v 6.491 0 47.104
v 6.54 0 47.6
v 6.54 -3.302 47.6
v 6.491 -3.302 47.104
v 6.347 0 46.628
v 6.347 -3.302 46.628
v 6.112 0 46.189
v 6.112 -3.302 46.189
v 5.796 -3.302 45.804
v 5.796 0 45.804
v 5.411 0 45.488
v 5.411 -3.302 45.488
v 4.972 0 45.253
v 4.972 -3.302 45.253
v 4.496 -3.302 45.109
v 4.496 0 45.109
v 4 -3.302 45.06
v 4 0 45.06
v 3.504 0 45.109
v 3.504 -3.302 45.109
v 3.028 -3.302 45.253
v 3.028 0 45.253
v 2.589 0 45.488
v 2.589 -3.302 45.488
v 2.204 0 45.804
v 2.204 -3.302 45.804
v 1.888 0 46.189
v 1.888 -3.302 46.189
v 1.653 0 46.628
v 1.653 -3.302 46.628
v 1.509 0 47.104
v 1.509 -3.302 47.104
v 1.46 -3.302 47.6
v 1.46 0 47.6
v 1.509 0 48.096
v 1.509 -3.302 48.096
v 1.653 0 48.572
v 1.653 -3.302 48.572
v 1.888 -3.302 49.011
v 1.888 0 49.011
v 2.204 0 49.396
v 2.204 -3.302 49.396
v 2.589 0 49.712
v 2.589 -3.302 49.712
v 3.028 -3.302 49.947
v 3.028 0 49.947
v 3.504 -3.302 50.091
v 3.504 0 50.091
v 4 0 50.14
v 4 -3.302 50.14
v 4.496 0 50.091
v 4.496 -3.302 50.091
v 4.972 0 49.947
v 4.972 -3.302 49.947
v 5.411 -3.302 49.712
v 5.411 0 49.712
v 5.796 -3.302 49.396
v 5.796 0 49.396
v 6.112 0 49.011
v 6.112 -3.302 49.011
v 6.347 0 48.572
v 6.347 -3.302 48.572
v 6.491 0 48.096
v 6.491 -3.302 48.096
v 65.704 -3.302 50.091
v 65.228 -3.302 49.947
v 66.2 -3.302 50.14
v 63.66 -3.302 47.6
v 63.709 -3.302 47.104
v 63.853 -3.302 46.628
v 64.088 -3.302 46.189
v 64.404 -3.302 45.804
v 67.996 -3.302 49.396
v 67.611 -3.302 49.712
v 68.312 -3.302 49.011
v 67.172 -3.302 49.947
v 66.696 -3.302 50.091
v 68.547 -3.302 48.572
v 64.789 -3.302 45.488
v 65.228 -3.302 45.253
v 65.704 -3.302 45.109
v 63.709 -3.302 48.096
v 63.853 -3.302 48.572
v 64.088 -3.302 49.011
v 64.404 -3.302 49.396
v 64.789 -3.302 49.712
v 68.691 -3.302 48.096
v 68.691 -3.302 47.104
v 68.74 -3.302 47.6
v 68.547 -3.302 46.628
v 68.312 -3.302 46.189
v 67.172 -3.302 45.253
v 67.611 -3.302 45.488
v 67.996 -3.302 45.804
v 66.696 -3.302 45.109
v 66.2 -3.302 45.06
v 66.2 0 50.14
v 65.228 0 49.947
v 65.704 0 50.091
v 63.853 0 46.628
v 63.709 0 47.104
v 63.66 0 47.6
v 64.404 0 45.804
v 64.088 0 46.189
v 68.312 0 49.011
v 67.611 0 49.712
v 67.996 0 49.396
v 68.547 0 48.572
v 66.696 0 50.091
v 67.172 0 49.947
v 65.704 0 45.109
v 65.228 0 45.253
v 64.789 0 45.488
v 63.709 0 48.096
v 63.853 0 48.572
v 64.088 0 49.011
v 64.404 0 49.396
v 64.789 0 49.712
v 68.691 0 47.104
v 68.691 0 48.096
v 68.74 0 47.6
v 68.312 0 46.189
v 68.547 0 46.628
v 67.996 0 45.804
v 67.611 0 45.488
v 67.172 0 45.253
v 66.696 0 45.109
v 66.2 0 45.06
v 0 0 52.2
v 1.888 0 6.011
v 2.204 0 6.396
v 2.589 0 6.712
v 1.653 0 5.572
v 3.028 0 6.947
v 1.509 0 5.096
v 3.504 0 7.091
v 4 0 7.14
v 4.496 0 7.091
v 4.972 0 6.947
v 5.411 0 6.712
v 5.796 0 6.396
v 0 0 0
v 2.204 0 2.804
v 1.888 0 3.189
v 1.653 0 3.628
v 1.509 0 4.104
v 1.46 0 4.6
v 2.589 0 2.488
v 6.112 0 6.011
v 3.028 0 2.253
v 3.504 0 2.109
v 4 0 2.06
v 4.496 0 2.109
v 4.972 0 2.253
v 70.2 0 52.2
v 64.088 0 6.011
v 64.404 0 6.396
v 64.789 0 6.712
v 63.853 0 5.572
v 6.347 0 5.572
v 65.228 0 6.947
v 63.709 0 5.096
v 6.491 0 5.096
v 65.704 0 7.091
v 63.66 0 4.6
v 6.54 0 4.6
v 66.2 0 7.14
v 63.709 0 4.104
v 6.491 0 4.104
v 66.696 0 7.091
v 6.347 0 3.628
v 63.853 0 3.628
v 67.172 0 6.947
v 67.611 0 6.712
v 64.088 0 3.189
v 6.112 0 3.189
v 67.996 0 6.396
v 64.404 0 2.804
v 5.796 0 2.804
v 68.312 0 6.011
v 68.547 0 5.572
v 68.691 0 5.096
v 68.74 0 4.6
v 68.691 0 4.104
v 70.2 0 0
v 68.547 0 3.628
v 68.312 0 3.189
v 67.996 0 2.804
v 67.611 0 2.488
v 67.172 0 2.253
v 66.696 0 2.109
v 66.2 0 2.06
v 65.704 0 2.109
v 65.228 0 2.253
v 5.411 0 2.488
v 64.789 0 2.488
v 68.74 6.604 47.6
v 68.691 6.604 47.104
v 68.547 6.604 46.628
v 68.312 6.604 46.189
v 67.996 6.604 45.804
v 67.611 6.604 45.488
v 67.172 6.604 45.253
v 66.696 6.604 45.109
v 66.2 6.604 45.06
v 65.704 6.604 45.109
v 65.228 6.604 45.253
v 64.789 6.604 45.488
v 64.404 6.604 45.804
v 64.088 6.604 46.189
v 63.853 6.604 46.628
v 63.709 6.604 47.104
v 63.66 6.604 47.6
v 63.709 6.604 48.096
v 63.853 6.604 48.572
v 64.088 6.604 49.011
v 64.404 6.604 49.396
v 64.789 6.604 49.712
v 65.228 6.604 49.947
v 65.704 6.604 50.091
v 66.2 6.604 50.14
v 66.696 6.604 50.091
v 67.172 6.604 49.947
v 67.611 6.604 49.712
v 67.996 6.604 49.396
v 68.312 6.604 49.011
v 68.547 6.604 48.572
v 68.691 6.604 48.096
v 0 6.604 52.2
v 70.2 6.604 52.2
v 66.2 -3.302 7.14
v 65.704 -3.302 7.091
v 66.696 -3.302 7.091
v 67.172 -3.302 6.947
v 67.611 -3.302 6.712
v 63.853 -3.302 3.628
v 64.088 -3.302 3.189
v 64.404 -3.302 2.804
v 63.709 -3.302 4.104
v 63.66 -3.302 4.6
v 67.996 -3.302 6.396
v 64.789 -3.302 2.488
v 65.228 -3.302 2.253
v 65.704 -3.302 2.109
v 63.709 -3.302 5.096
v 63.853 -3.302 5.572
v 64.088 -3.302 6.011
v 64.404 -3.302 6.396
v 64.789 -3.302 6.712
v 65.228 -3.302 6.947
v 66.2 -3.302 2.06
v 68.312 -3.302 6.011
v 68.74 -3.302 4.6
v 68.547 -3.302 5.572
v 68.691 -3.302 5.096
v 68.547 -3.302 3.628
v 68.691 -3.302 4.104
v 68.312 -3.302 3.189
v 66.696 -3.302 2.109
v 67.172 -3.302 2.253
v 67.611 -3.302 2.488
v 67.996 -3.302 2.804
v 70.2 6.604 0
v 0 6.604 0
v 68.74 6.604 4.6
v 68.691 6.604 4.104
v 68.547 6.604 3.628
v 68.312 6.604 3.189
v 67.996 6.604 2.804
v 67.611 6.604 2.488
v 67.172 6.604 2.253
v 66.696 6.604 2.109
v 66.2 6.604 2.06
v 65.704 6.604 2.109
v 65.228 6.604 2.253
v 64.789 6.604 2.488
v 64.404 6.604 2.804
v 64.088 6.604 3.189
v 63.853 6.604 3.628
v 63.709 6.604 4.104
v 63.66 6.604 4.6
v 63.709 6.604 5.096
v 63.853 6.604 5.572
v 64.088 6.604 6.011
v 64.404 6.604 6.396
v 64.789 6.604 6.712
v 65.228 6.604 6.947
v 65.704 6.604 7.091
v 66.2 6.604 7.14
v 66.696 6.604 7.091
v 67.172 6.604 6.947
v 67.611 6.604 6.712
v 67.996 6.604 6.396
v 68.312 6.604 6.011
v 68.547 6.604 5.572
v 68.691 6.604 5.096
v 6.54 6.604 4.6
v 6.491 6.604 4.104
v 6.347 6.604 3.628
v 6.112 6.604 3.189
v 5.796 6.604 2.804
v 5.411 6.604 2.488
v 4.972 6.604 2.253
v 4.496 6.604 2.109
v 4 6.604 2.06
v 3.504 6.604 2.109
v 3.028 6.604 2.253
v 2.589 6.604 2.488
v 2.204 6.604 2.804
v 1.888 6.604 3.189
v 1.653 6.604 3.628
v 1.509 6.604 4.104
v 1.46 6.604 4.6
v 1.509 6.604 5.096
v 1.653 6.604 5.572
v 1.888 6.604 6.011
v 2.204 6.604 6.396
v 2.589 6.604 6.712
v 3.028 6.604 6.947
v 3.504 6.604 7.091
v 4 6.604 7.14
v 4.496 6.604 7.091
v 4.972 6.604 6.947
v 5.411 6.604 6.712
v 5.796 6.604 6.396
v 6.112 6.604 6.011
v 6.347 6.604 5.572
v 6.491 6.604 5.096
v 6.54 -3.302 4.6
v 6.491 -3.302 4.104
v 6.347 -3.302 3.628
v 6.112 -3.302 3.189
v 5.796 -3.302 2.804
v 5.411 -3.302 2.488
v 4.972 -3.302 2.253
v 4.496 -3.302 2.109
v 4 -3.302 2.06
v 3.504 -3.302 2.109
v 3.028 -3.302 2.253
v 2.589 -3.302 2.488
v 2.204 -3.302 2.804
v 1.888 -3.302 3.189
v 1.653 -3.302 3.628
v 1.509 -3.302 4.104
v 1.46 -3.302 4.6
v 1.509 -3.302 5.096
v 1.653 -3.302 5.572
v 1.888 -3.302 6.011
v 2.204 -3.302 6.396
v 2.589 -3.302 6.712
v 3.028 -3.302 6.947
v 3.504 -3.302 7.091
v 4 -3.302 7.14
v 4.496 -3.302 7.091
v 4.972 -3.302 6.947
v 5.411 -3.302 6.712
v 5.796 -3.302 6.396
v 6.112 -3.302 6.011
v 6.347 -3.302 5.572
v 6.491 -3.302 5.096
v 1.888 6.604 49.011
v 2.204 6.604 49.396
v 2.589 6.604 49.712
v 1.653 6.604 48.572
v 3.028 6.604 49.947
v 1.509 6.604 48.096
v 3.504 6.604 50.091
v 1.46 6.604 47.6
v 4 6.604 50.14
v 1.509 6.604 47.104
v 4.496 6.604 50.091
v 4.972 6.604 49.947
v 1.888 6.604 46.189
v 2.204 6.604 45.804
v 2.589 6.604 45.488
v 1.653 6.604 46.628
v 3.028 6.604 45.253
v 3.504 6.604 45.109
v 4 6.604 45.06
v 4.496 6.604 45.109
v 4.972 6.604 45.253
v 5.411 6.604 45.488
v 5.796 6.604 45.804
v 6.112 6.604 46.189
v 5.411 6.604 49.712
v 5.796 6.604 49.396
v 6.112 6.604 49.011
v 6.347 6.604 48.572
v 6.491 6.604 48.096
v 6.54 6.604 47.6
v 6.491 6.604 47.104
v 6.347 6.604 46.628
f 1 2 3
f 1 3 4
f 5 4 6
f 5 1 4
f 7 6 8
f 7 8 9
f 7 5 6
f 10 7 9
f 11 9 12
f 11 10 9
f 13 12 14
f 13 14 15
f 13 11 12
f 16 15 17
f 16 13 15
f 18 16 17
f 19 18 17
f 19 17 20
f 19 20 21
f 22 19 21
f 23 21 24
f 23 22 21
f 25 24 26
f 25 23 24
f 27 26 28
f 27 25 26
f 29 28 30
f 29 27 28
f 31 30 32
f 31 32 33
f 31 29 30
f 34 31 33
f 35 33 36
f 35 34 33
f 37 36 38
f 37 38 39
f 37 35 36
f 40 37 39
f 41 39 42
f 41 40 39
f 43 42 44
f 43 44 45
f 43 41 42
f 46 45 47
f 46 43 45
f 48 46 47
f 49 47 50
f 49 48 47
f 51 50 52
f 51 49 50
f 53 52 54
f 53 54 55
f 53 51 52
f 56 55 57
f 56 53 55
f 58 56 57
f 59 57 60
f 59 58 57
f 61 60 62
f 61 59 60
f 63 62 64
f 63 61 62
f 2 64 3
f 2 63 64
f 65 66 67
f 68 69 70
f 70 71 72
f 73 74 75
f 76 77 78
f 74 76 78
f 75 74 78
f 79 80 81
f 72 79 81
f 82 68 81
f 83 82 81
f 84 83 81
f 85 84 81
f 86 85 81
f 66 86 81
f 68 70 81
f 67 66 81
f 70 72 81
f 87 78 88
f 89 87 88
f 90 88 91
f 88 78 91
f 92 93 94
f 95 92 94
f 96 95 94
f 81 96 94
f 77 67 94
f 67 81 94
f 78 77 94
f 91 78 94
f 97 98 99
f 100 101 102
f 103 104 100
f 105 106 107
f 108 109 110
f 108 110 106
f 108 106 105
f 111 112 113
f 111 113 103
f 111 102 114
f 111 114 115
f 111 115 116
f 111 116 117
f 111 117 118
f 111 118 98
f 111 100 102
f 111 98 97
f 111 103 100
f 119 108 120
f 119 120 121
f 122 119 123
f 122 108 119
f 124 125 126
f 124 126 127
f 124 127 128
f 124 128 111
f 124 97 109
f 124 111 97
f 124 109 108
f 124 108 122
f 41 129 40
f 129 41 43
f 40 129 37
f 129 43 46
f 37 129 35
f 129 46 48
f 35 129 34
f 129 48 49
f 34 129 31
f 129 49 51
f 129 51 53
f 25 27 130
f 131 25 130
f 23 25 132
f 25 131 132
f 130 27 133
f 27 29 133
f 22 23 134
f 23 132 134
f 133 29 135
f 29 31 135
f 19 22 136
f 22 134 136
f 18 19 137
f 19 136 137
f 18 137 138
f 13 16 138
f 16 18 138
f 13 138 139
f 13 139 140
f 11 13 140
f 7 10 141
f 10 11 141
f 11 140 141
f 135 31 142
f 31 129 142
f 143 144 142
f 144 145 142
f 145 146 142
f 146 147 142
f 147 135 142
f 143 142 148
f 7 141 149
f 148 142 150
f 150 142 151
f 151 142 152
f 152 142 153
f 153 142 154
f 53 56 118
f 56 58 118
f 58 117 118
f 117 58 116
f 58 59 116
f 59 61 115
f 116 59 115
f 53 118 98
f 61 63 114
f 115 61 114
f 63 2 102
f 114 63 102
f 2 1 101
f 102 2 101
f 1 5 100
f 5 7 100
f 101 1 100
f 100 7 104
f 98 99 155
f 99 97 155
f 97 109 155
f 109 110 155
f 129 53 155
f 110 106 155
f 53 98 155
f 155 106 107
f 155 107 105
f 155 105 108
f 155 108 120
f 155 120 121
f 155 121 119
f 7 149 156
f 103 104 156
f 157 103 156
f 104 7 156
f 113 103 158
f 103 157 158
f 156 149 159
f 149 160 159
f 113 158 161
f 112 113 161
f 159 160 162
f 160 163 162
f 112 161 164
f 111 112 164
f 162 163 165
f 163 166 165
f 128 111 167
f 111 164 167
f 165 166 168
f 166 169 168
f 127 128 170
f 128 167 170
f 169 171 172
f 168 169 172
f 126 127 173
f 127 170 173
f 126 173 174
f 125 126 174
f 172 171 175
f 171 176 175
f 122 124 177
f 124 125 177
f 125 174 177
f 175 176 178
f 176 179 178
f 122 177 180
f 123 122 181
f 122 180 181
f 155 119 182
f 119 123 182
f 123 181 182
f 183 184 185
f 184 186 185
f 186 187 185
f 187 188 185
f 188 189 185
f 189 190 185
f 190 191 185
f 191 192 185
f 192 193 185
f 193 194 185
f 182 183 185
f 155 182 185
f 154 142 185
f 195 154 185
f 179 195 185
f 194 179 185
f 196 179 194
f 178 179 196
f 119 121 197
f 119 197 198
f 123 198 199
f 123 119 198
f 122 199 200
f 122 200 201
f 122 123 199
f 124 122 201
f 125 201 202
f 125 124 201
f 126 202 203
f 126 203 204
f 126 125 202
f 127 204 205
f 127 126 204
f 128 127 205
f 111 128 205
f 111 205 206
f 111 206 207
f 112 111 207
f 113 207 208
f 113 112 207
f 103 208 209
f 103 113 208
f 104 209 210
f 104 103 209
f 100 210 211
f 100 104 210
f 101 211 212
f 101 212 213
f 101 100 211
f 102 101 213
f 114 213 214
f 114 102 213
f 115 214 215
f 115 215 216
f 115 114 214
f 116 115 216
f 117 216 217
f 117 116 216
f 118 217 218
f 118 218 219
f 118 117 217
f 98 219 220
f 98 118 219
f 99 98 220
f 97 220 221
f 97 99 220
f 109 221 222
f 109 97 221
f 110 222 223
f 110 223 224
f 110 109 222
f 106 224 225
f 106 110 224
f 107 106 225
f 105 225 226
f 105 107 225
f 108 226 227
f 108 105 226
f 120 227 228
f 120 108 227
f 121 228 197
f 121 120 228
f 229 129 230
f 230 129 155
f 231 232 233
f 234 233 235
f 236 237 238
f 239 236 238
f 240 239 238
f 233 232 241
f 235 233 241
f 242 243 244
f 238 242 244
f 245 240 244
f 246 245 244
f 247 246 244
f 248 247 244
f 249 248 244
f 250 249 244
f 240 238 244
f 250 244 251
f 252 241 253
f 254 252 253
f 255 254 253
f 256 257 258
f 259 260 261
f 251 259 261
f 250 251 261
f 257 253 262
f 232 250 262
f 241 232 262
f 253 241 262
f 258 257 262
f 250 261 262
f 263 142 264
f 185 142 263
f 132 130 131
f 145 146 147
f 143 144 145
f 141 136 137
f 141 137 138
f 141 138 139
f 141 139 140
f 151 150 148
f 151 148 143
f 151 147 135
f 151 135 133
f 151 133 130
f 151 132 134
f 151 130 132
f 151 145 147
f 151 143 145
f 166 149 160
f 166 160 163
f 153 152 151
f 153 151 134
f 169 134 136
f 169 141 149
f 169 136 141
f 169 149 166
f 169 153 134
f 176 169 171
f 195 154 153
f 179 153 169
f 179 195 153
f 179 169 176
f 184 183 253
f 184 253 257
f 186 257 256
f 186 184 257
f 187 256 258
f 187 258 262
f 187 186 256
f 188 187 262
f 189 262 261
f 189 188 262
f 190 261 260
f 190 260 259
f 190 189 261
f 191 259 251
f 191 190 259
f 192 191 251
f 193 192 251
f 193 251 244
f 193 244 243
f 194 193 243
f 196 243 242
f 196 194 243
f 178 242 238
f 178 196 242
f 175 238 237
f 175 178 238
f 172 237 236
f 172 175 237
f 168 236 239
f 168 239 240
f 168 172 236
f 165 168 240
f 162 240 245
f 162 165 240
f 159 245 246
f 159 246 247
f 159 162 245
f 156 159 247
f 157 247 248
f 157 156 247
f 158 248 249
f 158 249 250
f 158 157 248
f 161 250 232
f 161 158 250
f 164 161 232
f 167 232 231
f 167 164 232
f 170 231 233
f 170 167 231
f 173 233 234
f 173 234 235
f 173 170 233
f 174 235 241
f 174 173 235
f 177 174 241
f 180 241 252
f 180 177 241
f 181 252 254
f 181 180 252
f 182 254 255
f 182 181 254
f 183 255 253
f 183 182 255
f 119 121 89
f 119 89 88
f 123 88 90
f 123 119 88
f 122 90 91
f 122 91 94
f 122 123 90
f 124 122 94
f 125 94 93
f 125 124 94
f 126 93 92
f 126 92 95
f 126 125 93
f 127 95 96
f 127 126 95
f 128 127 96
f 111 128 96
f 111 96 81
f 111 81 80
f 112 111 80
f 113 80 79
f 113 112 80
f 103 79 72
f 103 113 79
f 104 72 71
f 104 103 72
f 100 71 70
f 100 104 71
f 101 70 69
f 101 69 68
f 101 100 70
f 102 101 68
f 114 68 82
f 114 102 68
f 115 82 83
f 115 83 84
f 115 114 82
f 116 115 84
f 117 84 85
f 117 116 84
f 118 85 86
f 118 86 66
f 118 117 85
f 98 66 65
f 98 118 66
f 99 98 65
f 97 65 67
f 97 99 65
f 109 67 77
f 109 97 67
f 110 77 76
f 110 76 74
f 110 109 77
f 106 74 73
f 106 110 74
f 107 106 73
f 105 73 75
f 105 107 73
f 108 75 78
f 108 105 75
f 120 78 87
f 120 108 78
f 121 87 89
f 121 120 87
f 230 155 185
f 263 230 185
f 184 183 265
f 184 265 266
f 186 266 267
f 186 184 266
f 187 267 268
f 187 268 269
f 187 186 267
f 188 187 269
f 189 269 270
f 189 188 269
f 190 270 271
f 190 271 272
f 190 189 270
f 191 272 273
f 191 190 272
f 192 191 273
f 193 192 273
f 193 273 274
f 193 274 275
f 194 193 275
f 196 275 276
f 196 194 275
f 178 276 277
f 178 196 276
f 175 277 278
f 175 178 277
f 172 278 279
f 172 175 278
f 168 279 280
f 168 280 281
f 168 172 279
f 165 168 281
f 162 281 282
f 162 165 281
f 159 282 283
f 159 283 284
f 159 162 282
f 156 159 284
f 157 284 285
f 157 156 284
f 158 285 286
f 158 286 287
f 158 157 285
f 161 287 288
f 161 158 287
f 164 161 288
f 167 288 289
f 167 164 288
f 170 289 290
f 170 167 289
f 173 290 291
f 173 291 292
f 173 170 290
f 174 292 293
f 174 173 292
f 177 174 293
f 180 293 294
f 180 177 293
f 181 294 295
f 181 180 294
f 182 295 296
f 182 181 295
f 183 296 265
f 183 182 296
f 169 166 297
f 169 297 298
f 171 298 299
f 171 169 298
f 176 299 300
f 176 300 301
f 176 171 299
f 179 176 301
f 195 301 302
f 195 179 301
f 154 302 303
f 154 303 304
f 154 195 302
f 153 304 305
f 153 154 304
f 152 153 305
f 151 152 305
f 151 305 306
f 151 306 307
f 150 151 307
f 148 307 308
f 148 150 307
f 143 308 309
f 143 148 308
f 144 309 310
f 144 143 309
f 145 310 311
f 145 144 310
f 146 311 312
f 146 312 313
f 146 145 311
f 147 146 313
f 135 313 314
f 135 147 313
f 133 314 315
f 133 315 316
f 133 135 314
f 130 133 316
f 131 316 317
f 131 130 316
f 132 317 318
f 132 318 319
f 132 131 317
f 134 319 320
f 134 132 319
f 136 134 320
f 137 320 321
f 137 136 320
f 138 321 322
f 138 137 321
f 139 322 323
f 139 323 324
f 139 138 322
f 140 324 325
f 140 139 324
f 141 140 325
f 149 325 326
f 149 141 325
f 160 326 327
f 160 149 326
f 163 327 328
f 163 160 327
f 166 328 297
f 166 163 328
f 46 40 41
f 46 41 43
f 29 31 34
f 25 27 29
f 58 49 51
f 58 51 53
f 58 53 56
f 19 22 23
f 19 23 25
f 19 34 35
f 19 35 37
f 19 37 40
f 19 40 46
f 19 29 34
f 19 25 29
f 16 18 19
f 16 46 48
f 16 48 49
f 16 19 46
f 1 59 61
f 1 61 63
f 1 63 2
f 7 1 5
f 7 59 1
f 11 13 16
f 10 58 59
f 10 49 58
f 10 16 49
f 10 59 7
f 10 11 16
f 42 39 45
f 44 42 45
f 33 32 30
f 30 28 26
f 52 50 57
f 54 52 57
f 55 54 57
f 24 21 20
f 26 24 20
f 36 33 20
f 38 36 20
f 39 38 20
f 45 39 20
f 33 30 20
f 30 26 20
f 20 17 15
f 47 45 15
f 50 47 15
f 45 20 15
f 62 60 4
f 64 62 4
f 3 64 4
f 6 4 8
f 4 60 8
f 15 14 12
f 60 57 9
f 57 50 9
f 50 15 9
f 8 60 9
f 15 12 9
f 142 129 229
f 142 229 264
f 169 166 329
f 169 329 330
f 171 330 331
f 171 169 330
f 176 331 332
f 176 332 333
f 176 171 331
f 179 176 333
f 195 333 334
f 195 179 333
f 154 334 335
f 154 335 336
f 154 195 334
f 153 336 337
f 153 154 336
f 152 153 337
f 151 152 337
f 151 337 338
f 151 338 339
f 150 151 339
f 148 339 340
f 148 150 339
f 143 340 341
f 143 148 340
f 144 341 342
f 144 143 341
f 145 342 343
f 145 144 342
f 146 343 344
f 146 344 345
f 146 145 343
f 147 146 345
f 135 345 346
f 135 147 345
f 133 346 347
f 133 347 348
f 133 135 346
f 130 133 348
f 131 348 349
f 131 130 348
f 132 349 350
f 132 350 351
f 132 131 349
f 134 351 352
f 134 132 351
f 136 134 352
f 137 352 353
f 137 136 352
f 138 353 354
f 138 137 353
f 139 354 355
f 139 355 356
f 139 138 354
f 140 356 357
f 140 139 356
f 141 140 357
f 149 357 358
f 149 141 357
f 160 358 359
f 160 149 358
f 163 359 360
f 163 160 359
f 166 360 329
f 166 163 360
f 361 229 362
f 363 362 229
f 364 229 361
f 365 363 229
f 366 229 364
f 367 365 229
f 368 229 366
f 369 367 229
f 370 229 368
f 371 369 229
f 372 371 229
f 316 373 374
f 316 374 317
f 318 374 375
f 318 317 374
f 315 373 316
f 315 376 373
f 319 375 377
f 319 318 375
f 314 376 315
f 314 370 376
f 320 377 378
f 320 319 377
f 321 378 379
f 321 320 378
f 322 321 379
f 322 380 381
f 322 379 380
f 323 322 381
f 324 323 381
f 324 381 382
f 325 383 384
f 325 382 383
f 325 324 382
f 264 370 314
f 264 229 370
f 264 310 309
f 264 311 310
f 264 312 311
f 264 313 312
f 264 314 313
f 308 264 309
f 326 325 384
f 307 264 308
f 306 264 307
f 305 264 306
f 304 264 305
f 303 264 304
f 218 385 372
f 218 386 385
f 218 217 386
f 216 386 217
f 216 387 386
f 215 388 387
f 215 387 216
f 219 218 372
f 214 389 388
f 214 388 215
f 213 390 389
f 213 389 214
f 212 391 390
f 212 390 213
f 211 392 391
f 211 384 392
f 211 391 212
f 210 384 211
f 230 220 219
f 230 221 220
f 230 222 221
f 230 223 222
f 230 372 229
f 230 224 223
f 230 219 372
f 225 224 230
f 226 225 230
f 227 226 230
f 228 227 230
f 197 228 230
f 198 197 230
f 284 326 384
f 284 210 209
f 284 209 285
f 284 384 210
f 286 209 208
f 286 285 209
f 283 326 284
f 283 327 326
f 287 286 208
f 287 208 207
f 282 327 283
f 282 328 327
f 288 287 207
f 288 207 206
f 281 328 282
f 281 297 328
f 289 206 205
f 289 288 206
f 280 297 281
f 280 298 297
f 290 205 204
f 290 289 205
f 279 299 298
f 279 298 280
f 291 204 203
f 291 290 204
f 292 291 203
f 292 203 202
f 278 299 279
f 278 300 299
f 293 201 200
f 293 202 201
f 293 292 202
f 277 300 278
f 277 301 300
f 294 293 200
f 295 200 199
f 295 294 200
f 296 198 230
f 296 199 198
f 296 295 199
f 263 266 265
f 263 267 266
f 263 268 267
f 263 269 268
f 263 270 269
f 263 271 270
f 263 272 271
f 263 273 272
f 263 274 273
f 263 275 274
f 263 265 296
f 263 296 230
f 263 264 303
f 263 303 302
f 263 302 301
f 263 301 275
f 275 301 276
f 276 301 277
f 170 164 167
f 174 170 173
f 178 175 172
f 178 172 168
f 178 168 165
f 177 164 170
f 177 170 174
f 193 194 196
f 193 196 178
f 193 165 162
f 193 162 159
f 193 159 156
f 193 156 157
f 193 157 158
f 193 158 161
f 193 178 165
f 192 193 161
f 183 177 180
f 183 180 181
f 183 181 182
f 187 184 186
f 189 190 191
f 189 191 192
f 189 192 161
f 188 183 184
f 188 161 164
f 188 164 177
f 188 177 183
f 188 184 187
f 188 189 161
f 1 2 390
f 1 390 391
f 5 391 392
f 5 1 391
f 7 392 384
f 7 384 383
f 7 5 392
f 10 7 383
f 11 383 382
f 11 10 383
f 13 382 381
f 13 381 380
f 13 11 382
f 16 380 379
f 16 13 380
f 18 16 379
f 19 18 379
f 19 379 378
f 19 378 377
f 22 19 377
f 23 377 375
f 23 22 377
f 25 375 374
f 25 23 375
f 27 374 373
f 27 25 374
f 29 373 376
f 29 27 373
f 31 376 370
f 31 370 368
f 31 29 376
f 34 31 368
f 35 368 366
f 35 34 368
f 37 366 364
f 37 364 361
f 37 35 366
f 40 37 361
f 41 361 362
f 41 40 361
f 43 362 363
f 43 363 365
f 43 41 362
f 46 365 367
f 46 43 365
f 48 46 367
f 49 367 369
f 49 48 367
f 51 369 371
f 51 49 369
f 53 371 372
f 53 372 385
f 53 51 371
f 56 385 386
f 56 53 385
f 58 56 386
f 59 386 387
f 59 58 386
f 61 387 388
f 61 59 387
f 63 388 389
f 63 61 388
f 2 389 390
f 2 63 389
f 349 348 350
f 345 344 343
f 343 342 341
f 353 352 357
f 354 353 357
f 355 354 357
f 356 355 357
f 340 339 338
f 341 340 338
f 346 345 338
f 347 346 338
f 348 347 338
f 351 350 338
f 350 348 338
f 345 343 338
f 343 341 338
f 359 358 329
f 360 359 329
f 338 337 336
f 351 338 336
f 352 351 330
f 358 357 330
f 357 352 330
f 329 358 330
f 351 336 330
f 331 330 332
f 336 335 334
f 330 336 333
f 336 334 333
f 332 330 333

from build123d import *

# Parameters (mm, degrees)
SKETCH1_W             = 70.2
SKETCH1_H             = 52.2
SKETCH1_R             = 2.54
BOSS_EXTRUDE1_DEPTH   = 6.604
SKETCH1_2_R           = 2.54
BOSS_EXTRUDE2_DEPTH   = 3.302
BOSS_EXTRUDE2_2_DEPTH = 3.302
BOSS_EXTRUDE2_3_DEPTH = 3.302
BOSS_EXTRUDE2_4_DEPTH = 3.302


with BuildPart() as part:
    # Sketch1 → Boss-Extrude1 (new body)
    with BuildSketch(Plane(origin=(0, 0, 0), x_dir=(1, 0, 0), z_dir=(0, 1, 0))):
        with Locations((35.1, -26.1)):
            Rectangle(SKETCH1_W, SKETCH1_H)
        with Locations((4, -4.6)):
            Circle(SKETCH1_R, mode=Mode.SUBTRACT)
        with Locations((66.2, -4.6)):
            Circle(SKETCH1_R, mode=Mode.SUBTRACT)
        with Locations((66.2, -47.6)):
            Circle(SKETCH1_R, mode=Mode.SUBTRACT)
        with Locations((4, -47.6)):
            Circle(SKETCH1_R, mode=Mode.SUBTRACT)
    extrude(amount=BOSS_EXTRUDE1_DEPTH)


with BuildPart() as body_2:
    # Sketch1<2> → Boss-Extrude2 (new body)
    with BuildSketch(Plane(origin=(0, 0, 0), x_dir=(1, 0, 0), z_dir=(0, 1, 0))):
        with Locations((66.2, -4.6)):
            Circle(SKETCH1_2_R)
    extrude(amount=-BOSS_EXTRUDE2_DEPTH)


with BuildPart() as body_3:
    # Sketch1<2> → Boss-Extrude2 2 (new body)
    with BuildSketch(Plane(origin=(0, 0, 0), x_dir=(1, 0, 0), z_dir=(0, 1, 0))):
        with Locations((66.2, -47.6)):
            Circle(SKETCH1_2_R)
    extrude(amount=-BOSS_EXTRUDE2_2_DEPTH)


with BuildPart() as body_4:
    # Sketch1<2> → Boss-Extrude2 3 (new body)
    with BuildSketch(Plane(origin=(0, 0, 0), x_dir=(1, 0, 0), z_dir=(0, 1, 0))):
        with Locations((4, -47.6)):
            Circle(SKETCH1_2_R)
    extrude(amount=-BOSS_EXTRUDE2_3_DEPTH)


with BuildPart() as body_5:
    # Sketch1<2> → Boss-Extrude2 4 (new body)
    with BuildSketch(Plane(origin=(0, 0, 0), x_dir=(1, 0, 0), z_dir=(0, 1, 0))):
        with Locations((4, -4.6)):
            Circle(SKETCH1_2_R)
    extrude(amount=-BOSS_EXTRUDE2_4_DEPTH)


solid = Compound([part.part, body_2.part, body_3.part, body_4.part, body_5.part])
